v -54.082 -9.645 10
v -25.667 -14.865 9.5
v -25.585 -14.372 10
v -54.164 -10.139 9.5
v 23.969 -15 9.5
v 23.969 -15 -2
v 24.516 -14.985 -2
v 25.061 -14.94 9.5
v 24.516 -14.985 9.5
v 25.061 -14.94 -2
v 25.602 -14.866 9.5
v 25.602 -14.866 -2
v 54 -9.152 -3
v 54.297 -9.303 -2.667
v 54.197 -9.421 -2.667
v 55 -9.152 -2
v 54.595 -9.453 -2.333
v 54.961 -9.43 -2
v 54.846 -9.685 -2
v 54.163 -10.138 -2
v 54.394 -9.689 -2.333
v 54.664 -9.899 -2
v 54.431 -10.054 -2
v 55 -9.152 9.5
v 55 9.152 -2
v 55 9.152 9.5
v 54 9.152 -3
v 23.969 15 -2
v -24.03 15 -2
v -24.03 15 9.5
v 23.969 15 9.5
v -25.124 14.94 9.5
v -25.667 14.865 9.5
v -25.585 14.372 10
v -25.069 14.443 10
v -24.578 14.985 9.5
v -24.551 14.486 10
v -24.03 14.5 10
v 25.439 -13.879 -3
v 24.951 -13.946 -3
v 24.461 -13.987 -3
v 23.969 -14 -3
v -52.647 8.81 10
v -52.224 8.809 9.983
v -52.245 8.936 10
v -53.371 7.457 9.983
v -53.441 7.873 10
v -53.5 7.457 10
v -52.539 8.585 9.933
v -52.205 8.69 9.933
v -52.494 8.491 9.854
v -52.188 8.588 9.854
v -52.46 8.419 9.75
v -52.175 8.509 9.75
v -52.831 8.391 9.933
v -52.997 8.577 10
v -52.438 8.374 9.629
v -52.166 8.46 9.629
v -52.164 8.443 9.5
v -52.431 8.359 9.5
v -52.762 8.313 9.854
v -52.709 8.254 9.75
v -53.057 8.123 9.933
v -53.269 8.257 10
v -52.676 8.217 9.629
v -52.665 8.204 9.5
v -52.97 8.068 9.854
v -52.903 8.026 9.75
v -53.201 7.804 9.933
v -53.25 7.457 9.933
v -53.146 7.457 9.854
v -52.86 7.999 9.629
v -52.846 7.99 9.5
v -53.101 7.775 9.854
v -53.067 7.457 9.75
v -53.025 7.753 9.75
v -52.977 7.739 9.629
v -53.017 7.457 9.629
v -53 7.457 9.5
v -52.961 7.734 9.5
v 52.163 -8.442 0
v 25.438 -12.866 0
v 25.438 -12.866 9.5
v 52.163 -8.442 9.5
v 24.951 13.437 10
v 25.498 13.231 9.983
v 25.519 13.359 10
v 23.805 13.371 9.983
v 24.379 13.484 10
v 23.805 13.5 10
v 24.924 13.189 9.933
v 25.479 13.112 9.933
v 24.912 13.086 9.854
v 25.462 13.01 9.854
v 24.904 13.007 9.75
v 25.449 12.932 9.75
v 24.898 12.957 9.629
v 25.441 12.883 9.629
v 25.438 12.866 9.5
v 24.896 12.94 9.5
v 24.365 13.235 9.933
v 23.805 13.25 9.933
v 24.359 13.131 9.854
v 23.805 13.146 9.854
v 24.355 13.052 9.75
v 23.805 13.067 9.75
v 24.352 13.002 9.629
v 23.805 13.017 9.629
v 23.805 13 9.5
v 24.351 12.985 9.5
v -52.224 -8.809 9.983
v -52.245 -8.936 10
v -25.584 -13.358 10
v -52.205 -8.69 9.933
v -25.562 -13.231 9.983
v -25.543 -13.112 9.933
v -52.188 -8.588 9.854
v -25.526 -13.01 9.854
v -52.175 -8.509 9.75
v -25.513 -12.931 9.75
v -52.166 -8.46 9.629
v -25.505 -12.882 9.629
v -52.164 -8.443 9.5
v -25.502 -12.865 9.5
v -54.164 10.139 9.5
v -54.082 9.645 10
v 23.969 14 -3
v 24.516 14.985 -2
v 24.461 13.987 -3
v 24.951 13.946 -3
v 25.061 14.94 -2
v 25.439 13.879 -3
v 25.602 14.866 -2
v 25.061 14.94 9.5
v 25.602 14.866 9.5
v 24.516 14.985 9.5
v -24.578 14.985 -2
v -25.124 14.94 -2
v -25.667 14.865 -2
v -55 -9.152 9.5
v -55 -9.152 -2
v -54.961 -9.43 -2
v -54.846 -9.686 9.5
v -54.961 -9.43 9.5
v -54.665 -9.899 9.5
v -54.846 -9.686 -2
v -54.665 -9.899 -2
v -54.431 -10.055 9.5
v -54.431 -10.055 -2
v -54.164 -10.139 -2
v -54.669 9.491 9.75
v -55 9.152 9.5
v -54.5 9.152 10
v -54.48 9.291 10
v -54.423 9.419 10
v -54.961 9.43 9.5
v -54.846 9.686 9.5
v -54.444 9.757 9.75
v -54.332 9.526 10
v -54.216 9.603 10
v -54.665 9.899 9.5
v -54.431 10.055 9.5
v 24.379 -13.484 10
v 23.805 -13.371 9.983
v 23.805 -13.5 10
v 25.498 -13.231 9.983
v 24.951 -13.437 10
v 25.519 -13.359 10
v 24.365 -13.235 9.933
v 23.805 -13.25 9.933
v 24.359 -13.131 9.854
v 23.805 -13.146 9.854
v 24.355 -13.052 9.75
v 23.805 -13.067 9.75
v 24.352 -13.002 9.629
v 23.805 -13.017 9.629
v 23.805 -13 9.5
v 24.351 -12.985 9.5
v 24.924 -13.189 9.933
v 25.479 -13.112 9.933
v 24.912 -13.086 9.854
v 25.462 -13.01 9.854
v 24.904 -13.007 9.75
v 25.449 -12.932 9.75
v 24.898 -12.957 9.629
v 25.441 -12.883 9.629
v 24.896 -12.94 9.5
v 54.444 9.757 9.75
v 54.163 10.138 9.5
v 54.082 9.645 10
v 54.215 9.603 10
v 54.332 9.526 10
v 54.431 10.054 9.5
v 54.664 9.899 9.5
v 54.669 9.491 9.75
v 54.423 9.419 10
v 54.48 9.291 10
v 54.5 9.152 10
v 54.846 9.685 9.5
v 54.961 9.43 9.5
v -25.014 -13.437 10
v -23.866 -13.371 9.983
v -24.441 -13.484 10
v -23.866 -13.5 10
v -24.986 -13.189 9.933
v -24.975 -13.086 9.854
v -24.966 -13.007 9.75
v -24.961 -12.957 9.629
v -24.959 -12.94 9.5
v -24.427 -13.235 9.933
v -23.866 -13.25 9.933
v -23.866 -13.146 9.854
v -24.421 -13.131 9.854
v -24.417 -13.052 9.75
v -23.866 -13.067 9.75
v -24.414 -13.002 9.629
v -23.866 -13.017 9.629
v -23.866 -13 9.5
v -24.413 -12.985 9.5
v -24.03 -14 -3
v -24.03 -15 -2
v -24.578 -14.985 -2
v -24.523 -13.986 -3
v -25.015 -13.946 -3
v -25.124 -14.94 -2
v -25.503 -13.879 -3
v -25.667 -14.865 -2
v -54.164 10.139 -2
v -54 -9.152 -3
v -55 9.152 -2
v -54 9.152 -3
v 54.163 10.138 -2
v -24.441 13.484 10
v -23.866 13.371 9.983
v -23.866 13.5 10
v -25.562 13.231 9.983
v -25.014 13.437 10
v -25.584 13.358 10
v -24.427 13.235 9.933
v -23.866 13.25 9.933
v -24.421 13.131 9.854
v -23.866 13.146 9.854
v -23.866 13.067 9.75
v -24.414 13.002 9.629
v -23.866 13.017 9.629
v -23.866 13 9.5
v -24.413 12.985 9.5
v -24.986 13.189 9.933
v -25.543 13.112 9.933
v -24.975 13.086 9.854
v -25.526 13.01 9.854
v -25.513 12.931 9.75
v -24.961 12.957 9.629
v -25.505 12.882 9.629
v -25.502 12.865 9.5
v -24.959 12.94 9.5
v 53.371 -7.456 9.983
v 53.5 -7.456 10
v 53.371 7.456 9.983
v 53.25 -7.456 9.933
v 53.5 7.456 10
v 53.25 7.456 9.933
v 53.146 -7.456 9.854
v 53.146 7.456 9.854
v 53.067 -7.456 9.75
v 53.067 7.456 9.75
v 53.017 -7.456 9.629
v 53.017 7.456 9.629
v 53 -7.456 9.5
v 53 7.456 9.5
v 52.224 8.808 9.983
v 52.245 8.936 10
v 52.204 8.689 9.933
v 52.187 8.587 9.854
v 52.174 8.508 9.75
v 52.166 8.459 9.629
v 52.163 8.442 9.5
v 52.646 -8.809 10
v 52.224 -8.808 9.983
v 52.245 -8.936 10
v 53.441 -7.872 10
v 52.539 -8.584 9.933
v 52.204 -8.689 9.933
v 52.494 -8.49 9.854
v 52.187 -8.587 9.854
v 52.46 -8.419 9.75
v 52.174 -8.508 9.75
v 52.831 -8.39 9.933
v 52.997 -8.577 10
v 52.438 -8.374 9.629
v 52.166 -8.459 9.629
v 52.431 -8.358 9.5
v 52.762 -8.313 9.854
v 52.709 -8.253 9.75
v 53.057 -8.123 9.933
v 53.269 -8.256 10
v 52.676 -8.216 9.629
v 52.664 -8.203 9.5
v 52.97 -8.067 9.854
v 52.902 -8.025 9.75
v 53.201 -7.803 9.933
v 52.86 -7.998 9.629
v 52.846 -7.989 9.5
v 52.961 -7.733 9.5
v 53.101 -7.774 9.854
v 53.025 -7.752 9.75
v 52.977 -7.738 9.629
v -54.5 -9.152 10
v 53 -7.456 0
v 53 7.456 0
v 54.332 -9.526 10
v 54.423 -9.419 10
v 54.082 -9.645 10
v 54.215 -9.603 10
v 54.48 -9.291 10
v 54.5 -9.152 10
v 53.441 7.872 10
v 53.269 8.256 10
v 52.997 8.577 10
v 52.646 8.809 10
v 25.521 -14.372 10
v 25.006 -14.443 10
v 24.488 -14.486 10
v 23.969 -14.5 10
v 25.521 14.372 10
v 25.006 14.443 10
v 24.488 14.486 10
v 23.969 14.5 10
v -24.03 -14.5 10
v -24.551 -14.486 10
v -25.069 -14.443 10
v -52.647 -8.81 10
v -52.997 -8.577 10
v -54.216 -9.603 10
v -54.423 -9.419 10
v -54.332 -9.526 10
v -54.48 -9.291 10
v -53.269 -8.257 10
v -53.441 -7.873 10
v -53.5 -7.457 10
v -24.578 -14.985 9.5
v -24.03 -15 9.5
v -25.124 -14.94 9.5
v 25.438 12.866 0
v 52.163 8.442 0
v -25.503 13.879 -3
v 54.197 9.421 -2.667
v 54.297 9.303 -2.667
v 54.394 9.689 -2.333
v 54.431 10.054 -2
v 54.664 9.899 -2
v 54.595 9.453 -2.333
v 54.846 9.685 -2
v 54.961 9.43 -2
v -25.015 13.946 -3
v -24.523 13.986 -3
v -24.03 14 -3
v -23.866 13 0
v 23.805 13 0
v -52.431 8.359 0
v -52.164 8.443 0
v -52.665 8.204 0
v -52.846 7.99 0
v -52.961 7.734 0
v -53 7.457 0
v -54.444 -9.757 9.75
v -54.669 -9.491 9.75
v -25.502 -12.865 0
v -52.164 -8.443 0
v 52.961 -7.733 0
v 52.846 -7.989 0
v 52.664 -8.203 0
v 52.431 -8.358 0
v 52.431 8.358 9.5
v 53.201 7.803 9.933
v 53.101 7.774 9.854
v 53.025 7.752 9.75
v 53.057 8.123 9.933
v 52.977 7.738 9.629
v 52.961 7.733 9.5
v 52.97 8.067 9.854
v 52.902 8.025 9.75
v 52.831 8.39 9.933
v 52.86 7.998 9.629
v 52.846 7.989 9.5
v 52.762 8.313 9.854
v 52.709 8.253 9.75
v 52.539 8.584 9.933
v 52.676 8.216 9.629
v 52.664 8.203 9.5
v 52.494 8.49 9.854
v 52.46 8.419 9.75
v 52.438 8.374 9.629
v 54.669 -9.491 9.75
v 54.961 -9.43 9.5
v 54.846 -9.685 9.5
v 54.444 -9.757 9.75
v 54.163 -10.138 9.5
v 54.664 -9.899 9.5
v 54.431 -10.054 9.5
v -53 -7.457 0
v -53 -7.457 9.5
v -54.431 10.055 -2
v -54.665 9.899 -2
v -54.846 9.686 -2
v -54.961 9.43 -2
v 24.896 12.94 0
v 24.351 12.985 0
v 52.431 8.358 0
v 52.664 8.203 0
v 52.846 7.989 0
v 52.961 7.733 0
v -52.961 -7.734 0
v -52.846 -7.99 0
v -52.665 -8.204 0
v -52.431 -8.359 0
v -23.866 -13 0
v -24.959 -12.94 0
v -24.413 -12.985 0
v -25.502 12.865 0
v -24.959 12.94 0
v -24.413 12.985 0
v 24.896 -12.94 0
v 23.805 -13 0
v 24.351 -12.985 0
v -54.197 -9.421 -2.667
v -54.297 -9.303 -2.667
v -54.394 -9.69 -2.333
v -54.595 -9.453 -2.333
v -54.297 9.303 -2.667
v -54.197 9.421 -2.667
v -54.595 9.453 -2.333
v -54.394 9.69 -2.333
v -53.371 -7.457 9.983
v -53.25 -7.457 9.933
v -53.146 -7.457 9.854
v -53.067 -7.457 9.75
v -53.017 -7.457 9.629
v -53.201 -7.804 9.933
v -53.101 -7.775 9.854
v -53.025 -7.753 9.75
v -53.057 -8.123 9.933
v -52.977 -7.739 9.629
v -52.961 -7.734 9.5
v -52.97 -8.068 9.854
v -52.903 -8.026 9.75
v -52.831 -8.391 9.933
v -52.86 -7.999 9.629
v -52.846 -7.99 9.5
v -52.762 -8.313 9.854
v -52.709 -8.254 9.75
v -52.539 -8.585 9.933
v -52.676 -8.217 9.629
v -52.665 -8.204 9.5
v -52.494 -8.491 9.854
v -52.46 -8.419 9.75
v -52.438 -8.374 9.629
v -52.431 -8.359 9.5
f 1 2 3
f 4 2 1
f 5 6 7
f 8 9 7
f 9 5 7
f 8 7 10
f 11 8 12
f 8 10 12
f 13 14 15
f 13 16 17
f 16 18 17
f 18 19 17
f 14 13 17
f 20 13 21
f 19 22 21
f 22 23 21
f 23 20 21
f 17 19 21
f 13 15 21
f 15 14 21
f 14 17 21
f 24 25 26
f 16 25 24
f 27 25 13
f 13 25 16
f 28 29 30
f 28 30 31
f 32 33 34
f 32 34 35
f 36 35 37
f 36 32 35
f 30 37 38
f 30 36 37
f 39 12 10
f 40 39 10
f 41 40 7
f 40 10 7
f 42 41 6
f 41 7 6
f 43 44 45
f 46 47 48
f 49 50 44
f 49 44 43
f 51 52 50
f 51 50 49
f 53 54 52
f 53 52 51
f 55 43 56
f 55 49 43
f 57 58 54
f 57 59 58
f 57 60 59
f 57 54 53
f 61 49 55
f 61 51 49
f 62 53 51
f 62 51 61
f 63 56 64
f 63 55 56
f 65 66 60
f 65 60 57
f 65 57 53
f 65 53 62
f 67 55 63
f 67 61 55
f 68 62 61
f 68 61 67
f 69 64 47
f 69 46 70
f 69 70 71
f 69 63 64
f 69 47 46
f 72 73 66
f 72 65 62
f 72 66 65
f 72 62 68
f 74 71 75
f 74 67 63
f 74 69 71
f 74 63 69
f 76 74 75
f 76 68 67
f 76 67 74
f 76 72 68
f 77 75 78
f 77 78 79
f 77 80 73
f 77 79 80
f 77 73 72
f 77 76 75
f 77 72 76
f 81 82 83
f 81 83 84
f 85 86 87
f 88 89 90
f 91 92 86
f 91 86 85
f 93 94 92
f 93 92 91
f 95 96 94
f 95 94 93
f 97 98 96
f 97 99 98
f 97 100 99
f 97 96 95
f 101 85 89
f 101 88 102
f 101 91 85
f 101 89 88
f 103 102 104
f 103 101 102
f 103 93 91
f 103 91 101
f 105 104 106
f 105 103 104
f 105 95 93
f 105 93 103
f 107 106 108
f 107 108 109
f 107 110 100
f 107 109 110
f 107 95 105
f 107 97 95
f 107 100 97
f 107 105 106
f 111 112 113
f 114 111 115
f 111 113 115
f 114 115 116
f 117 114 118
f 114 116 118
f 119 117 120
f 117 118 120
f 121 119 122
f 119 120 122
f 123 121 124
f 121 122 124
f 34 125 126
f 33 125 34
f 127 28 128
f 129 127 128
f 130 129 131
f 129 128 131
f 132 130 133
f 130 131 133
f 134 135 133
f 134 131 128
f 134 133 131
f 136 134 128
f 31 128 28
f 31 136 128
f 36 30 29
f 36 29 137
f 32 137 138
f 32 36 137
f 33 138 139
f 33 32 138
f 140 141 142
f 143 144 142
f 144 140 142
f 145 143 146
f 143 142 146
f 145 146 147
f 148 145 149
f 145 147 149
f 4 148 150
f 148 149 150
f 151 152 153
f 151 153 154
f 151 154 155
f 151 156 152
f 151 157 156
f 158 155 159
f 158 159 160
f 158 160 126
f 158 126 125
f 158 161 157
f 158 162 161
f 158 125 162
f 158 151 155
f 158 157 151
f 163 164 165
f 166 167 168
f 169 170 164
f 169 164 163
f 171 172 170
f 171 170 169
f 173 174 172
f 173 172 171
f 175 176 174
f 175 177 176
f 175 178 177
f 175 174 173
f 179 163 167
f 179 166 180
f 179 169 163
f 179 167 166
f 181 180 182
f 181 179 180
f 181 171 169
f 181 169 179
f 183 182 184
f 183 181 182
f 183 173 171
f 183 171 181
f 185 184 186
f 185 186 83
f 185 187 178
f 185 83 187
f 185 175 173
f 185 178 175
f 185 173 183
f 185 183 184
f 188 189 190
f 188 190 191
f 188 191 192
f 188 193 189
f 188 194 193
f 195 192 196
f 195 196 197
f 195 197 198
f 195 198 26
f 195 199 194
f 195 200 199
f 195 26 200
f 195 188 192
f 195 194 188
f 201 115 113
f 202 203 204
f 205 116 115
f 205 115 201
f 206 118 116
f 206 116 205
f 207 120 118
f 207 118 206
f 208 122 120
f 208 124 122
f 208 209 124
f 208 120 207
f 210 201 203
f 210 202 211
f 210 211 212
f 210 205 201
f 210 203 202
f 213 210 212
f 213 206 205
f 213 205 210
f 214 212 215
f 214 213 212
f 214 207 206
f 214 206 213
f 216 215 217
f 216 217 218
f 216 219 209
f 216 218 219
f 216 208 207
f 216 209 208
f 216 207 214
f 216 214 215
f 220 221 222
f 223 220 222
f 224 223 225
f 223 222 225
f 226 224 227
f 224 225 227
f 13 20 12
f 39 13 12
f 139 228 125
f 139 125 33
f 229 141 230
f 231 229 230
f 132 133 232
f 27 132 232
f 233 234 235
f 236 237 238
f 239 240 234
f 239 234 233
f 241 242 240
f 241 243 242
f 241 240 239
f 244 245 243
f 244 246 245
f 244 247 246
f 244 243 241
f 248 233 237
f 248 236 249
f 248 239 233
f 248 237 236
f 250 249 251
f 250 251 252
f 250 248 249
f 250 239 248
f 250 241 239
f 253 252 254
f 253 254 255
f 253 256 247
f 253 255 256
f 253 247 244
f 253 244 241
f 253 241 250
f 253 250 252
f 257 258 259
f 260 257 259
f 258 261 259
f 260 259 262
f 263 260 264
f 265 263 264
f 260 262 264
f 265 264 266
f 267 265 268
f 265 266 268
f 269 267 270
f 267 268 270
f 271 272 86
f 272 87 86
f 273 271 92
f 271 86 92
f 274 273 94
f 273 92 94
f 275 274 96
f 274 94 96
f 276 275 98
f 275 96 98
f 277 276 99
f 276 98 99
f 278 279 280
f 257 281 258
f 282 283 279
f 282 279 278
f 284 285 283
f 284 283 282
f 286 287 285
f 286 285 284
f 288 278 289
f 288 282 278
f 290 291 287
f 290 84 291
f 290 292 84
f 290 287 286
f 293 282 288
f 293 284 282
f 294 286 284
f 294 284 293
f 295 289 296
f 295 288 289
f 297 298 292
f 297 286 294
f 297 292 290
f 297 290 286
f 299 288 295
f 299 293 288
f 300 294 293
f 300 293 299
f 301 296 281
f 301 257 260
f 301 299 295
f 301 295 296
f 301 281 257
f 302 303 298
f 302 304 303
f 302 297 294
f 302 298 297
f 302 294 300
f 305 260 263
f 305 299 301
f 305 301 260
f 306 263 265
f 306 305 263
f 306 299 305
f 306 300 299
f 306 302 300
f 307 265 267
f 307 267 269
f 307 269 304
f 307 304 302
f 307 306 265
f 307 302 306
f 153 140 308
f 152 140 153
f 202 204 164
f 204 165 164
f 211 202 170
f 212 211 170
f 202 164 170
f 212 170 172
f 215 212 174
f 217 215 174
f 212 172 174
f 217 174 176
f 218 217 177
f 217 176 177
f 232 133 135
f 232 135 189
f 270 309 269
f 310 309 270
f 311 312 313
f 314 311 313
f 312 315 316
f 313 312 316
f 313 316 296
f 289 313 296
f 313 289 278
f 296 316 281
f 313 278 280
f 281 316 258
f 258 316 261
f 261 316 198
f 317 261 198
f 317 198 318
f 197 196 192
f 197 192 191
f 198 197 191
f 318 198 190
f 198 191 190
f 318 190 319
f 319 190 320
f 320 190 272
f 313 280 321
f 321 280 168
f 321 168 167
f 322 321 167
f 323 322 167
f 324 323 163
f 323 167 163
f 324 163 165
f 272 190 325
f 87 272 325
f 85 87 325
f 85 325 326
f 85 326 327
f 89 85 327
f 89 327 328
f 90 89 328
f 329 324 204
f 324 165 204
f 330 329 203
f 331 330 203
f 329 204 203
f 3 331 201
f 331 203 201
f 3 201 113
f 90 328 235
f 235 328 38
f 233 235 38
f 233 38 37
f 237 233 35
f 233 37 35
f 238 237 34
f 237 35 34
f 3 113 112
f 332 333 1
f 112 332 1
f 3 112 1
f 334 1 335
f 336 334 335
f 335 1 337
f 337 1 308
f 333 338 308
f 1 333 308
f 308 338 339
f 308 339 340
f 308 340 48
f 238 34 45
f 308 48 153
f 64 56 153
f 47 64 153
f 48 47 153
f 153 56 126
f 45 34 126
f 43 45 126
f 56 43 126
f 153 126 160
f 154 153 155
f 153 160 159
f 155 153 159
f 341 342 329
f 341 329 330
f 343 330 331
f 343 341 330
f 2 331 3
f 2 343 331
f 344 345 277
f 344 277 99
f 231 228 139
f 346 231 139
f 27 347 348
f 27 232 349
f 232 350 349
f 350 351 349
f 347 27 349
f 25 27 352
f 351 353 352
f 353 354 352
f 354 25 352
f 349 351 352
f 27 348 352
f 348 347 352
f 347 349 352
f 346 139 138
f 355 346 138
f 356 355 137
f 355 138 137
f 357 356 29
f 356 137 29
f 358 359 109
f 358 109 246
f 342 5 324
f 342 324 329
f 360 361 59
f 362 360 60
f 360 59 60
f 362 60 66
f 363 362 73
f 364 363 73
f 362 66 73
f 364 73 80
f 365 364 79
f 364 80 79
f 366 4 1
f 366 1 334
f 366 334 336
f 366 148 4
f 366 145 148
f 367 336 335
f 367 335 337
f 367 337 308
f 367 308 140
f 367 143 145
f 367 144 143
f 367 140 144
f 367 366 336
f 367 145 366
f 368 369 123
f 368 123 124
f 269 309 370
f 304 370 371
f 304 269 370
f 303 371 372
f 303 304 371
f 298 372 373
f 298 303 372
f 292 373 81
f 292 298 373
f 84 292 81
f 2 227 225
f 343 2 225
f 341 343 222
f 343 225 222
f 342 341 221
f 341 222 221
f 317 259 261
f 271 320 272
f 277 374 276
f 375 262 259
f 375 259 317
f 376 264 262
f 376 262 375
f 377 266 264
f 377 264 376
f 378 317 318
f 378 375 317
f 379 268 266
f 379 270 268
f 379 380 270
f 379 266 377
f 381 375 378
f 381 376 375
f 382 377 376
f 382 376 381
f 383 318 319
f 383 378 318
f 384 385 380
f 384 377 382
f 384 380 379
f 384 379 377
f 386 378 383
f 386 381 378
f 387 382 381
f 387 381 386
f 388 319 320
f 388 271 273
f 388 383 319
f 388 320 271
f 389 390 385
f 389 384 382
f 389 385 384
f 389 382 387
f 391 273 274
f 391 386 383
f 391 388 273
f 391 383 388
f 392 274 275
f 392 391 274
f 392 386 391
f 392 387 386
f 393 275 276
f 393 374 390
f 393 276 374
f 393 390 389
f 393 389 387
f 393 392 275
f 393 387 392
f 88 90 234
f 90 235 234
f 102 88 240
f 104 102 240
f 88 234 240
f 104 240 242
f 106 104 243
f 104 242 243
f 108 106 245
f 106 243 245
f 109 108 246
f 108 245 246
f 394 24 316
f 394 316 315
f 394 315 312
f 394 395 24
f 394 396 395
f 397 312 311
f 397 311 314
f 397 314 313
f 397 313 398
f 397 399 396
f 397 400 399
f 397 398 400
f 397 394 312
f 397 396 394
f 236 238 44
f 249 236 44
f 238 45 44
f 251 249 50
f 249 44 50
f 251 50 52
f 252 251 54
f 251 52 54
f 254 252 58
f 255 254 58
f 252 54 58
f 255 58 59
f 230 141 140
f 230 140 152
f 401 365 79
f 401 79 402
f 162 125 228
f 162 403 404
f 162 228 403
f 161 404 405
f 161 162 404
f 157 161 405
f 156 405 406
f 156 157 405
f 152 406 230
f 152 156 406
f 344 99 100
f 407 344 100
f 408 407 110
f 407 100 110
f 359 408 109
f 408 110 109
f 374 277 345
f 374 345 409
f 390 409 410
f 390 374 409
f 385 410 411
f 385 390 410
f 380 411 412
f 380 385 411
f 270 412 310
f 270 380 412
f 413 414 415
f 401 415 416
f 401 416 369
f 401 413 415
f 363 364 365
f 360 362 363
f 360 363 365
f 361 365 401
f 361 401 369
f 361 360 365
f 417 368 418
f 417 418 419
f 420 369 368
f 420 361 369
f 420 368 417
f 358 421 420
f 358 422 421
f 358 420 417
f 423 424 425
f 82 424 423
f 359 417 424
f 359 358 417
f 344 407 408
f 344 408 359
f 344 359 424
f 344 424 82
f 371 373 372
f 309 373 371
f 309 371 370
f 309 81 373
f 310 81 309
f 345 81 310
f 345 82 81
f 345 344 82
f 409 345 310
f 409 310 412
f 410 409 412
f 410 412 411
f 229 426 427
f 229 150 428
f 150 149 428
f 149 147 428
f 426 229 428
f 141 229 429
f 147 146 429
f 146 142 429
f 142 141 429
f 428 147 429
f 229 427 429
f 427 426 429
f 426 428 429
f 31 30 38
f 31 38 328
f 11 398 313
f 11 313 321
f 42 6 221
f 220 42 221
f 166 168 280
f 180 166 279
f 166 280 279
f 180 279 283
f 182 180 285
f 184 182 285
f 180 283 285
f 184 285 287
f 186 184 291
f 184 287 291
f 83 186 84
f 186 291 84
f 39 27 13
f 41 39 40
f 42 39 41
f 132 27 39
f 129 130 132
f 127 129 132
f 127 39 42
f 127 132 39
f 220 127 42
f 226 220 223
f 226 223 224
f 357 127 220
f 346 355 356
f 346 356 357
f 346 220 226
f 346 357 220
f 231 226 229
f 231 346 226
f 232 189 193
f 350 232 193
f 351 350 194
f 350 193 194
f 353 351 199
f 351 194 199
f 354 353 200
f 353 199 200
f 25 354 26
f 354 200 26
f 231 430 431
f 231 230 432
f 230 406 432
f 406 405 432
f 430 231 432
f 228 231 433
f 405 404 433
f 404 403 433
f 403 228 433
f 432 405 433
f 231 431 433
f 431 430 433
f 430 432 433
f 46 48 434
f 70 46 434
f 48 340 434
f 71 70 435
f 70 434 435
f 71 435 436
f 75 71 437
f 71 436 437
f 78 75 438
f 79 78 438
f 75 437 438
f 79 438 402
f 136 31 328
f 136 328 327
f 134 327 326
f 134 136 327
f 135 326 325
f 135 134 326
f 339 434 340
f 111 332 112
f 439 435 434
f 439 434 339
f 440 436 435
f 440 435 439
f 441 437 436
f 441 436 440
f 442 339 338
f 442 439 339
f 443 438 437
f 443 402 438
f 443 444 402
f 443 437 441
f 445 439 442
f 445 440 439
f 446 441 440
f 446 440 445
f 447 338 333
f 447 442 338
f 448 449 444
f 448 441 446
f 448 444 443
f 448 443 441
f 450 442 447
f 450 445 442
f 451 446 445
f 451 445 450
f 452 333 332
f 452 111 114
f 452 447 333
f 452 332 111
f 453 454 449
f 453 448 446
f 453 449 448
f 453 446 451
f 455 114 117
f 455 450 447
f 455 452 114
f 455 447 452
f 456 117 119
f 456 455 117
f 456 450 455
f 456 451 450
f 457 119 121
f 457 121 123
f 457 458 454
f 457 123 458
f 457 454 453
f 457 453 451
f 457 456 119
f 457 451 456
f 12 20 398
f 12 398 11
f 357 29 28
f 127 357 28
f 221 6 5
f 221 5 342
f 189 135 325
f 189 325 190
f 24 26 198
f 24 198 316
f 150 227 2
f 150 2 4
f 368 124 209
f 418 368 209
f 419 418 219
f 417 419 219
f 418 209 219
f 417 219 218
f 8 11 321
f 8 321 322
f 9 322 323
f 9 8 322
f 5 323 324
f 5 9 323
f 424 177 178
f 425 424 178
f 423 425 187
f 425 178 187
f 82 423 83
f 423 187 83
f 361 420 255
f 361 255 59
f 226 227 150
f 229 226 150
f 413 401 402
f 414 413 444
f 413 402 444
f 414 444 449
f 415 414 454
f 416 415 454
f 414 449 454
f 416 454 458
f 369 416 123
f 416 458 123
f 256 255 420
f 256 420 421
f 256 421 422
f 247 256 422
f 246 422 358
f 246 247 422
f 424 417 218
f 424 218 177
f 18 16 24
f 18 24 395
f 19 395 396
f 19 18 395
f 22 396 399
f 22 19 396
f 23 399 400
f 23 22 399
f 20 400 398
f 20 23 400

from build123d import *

# Parameters (mm, degrees)
BOSS_EXTRUDE1_DEPTH = 3
BOSS_EXTRUDE2_DEPTH = 3
BOSS_EXTRUDE3_DEPTH = 10
FILLET1_R           = 10
FILLET2_R           = 1
CHAMFER1_SIZE       = 1
CHAMFER2_SIZE       = 0.5
FILLET4_R           = 0.5


with BuildPart() as part:
    # Sketch1 → Boss-Extrude1 (new body)
    with BuildSketch(Plane.XY):
        Polygon((24.791261432, 15), (-24.85397009, 15), (-55, 10), (-55, -10), (-24.85397009, -15), (24.791261432, -15), (55, -10), (55, 10), align=None)
        Polygon((-53, 8.304395957), (-24.689236015, 13), (24.626864724, 13), (53, 8.303819918), (53, -8.303819918), (24.626864724, -13), (-24.689236015, -13), (-53, -8.304395957), align=None, mode=Mode.SUBTRACT)
    extrude(amount=-BOSS_EXTRUDE1_DEPTH)

    # Sketch3 → Boss-Extrude2 (add)
    with BuildSketch(Plane.XY):
        Polygon((-53, 8.304395957), (-53, -8.304395957), (-24.689236015, -13), (24.626864724, -13), (53, -8.303819918), (53, 8.303819918), (24.626864724, 13), (-24.689236015, 13), align=None)
    extrude(amount=-BOSS_EXTRUDE2_DEPTH)

    # Sketch1<4> → Boss-Extrude3 (add)
    with BuildSketch(Plane.XY):
        Polygon((24.791261432, 15), (-24.85397009, 15), (-55, 10), (-55, -10), (-24.85397009, -15), (24.791261432, -15), (55, -10), (55, 10), align=None)
        Polygon((-53, 8.304395957), (-24.689236015, 13), (24.626864724, 13), (53, 8.303819918), (53, -8.303819918), (24.626864724, -13), (-24.689236015, -13), (-53, -8.304395957), align=None, mode=Mode.SUBTRACT)
    extrude(amount=BOSS_EXTRUDE3_DEPTH)

    # Fillet1
    fillet1_edges = [part.edges().sort_by_distance(p)[0] for p in [
        (24.791261432, -15, 3.5),
        (24.626864724, -13, 5),
        (24.791261432, 15, 3.5),
        (24.626864724, 13, 5),
        (-24.689236015, 13, 5),
        (-24.85397009, 15, 3.5),
        (-24.689236015, -13, 5),
        (-24.85397009, -15, 3.5),
    ]]
    fillet(fillet1_edges, radius=FILLET1_R)

    # Fillet2
    fillet2_edges = [part.edges().sort_by_distance(p)[0] for p in [
        (55, 10, 3.5),
        (55, -10, 3.5),
        (53, -8.303819918, 5),
        (53, 8.303819918, 5),
        (-53, 8.304395957, 5),
        (-55, 10, 3.5),
        (-53, -8.304395957, 5),
        (-55, -10, 3.5),
    ]]
    fillet(fillet2_edges, radius=FILLET2_R)

    # Chamfer1
    chamfer1_edges = [part.edges().sort_by_distance(p)[0] for p in [
        (24.78849853, 14.966387387, -3),
        (-0.03051091, 15, -3),
        (-24.851190202, 14.966249987, -3),
        (-39.915081836, 12.501974258, -3),
        (-54.762766018, 9.79887255, -3),
        (-55, 0, -3),
        (-54.762766018, -9.79887255, -3),
        (-39.915081836, -12.501974258, -3),
        (-24.851190202, -14.966249987, -3),
        (-0.03051091, -15, -3),
        (24.78849853, -14.966387387, -3),
        (39.88275267, -12.50213151, -3),
        (54.762657657, -9.798712323, -3),
        (55, 0, -3),
        (54.762657657, 9.798712323, -3),
        (39.88275267, 12.50213151, -3),
    ]]
    chamfer(chamfer1_edges, length=CHAMFER1_SIZE)

    # Chamfer2
    chamfer2_edges = [part.edges().sort_by_distance(p)[0] for p in [
        (-54.762766018, -9.79887255, 10),
        (-39.915081836, -12.501974258, 10),
        (-55, 0, 10),
        (-24.851190202, -14.966249987, 10),
        (-54.762766018, 9.79887255, 10),
        (-0.03051091, -15, 10),
        (-39.915081836, 12.501974258, 10),
        (24.78849853, -14.966387387, 10),
        (-24.851190202, 14.966249987, 10),
        (39.88275267, -12.50213151, 10),
        (-0.03051091, 15, 10),
        (54.762657657, -9.798712323, 10),
        (24.78849853, 14.966387387, 10),
        (55, 0, 10),
        (54.762657657, 9.798712323, 10),
        (39.88275267, 12.50213151, 10),
    ]]
    chamfer(chamfer2_edges, length=CHAMFER2_SIZE)

    # Fillet4
    fillet4_edges = [part.edges().sort_by_distance(p)[0] for p in [
        (-24.686456127, 12.966249987, 10),
        (-38.832714799, 10.654172237, 10),
        (-52.762766018, 8.103268507, 10),
        (-53, 0, 10),
        (-52.762766018, -8.103268507, 10),
        (-38.832714799, -10.654172237, 10),
        (-24.686456127, -12.966249987, 10),
        (-0.030342226, -13, 10),
        (24.624101823, -12.966387387, 10),
        (38.800554316, -10.654041469, 10),
        (52.762657657, -8.10253224, 10),
        (53, 0, 10),
        (52.762657657, 8.10253224, 10),
        (38.800554316, 10.654041469, 10),
        (24.624101823, 12.966387387, 10),
        (-0.030342226, 13, 10),
    ]]
    fillet(fillet4_edges, radius=FILLET4_R)


solid = part.part
